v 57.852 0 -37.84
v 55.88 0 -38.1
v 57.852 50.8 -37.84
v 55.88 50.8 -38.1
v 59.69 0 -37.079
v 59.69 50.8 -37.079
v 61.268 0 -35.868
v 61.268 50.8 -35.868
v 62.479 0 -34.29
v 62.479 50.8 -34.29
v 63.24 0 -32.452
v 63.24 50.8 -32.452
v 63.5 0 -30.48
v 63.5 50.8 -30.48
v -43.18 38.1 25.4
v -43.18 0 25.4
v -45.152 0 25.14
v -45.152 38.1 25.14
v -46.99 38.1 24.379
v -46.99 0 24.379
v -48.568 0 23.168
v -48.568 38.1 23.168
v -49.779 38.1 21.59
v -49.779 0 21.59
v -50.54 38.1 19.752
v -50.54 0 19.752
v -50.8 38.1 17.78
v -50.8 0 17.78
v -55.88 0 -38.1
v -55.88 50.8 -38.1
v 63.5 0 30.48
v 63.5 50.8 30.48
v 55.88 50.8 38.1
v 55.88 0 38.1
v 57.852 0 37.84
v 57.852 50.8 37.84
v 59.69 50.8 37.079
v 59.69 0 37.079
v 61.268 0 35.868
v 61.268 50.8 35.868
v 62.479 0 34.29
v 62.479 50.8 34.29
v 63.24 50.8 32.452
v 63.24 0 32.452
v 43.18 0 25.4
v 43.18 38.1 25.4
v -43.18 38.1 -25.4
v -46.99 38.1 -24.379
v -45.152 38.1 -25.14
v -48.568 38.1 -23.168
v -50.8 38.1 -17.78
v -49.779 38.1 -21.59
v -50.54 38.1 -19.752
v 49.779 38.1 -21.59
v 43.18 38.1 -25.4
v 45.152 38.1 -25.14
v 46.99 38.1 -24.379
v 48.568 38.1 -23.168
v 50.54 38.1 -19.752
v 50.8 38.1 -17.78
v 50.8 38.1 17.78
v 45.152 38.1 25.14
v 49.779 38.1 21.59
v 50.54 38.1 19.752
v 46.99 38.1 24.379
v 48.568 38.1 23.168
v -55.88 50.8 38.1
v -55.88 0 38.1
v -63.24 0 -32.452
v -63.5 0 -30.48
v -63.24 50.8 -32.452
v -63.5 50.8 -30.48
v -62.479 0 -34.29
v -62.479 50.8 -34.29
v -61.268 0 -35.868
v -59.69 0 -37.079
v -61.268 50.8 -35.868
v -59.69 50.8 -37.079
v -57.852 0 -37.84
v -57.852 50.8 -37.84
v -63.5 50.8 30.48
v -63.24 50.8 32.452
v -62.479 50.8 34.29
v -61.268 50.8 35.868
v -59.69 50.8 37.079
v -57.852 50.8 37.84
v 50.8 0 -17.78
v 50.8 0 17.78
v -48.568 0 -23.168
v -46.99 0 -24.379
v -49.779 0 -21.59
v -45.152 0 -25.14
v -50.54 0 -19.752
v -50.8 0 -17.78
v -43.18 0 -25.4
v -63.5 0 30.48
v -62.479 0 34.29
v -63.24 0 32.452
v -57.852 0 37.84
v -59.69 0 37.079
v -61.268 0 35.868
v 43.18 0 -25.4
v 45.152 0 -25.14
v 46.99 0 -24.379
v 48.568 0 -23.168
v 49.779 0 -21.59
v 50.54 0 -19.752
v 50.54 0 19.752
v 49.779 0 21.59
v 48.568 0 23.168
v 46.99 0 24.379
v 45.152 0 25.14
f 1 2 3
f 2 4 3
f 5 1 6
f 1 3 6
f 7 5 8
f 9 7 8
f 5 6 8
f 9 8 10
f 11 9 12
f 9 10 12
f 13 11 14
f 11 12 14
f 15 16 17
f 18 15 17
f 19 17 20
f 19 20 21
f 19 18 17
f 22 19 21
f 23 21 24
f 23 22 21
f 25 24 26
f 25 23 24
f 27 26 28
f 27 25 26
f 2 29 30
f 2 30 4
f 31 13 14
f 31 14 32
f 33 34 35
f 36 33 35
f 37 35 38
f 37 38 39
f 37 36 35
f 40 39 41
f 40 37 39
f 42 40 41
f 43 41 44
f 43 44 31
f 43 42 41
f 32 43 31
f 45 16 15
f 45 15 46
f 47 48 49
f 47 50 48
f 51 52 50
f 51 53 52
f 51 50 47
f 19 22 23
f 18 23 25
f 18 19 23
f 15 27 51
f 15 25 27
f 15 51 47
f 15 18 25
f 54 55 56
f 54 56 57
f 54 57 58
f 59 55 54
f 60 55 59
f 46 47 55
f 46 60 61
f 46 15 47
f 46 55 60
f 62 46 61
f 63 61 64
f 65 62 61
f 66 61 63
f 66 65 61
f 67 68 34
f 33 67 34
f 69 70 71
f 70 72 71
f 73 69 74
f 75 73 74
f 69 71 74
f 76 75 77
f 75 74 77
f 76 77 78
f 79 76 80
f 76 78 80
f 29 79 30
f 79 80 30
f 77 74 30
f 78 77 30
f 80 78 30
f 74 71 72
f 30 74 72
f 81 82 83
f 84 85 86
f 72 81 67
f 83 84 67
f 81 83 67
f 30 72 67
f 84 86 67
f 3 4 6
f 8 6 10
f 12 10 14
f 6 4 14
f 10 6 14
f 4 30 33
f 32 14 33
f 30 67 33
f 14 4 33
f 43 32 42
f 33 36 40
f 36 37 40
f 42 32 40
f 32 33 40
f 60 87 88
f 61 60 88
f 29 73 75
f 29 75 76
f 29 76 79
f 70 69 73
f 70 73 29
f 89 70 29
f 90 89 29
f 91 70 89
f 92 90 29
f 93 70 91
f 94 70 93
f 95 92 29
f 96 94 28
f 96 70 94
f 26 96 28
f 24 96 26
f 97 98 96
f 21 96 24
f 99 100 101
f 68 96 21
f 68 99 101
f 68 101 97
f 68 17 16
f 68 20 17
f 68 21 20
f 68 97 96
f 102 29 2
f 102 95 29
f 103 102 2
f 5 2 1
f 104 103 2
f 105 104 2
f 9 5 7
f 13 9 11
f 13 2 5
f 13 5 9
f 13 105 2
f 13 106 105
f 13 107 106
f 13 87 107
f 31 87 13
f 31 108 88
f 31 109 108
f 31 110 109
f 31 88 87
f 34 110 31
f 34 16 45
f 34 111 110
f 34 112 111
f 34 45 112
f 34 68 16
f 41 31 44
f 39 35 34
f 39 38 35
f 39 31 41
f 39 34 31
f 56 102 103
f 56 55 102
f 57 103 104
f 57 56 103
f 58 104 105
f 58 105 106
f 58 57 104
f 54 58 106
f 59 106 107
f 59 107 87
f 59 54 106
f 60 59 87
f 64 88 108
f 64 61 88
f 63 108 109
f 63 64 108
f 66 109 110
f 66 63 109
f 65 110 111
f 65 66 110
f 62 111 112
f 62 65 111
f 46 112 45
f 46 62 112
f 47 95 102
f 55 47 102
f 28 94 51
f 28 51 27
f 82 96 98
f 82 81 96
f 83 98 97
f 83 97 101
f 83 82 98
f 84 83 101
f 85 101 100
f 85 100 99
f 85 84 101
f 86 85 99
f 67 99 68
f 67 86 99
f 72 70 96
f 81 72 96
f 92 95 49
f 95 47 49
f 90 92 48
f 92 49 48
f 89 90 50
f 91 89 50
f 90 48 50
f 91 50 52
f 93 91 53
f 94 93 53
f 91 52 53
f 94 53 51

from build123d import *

# Parameters (mm, degrees)
F0_W     = 127
F0_H     = 76.2
F1_DEPTH = 50.8
F2_W     = 101.6
F2_H     = 50.8
F3_DEPTH = 38.1
F4_R     = 7.62


with BuildPart() as f1:
    # F0 (on Front) → F1 (new body)
    with BuildSketch(Plane.XZ):
        Rectangle(F0_W, F0_H)
    extrude(amount=-F1_DEPTH)

    # F2 (on face) → F3 (cut)
    with BuildSketch(Plane.XZ):
        Rectangle(F2_W, F2_H)
    extrude(amount=-F3_DEPTH, mode=Mode.SUBTRACT)

    # F4
    f4_edges = [f1.edges().sort_by_distance(p)[0] for p in [
        (-50.8, 19.05, 25.4),
        (50.8, 19.05, 25.4),
        (50.8, 19.05, -25.4),
        (-50.8, 19.05, -25.4),
        (-63.5, 25.4, -38.1),
        (63.5, 25.4, -38.1),
        (63.5, 25.4, 38.1),
        (-63.5, 25.4, 38.1),
    ]]
    fillet(f4_edges, radius=F4_R)


solid = f1.part
